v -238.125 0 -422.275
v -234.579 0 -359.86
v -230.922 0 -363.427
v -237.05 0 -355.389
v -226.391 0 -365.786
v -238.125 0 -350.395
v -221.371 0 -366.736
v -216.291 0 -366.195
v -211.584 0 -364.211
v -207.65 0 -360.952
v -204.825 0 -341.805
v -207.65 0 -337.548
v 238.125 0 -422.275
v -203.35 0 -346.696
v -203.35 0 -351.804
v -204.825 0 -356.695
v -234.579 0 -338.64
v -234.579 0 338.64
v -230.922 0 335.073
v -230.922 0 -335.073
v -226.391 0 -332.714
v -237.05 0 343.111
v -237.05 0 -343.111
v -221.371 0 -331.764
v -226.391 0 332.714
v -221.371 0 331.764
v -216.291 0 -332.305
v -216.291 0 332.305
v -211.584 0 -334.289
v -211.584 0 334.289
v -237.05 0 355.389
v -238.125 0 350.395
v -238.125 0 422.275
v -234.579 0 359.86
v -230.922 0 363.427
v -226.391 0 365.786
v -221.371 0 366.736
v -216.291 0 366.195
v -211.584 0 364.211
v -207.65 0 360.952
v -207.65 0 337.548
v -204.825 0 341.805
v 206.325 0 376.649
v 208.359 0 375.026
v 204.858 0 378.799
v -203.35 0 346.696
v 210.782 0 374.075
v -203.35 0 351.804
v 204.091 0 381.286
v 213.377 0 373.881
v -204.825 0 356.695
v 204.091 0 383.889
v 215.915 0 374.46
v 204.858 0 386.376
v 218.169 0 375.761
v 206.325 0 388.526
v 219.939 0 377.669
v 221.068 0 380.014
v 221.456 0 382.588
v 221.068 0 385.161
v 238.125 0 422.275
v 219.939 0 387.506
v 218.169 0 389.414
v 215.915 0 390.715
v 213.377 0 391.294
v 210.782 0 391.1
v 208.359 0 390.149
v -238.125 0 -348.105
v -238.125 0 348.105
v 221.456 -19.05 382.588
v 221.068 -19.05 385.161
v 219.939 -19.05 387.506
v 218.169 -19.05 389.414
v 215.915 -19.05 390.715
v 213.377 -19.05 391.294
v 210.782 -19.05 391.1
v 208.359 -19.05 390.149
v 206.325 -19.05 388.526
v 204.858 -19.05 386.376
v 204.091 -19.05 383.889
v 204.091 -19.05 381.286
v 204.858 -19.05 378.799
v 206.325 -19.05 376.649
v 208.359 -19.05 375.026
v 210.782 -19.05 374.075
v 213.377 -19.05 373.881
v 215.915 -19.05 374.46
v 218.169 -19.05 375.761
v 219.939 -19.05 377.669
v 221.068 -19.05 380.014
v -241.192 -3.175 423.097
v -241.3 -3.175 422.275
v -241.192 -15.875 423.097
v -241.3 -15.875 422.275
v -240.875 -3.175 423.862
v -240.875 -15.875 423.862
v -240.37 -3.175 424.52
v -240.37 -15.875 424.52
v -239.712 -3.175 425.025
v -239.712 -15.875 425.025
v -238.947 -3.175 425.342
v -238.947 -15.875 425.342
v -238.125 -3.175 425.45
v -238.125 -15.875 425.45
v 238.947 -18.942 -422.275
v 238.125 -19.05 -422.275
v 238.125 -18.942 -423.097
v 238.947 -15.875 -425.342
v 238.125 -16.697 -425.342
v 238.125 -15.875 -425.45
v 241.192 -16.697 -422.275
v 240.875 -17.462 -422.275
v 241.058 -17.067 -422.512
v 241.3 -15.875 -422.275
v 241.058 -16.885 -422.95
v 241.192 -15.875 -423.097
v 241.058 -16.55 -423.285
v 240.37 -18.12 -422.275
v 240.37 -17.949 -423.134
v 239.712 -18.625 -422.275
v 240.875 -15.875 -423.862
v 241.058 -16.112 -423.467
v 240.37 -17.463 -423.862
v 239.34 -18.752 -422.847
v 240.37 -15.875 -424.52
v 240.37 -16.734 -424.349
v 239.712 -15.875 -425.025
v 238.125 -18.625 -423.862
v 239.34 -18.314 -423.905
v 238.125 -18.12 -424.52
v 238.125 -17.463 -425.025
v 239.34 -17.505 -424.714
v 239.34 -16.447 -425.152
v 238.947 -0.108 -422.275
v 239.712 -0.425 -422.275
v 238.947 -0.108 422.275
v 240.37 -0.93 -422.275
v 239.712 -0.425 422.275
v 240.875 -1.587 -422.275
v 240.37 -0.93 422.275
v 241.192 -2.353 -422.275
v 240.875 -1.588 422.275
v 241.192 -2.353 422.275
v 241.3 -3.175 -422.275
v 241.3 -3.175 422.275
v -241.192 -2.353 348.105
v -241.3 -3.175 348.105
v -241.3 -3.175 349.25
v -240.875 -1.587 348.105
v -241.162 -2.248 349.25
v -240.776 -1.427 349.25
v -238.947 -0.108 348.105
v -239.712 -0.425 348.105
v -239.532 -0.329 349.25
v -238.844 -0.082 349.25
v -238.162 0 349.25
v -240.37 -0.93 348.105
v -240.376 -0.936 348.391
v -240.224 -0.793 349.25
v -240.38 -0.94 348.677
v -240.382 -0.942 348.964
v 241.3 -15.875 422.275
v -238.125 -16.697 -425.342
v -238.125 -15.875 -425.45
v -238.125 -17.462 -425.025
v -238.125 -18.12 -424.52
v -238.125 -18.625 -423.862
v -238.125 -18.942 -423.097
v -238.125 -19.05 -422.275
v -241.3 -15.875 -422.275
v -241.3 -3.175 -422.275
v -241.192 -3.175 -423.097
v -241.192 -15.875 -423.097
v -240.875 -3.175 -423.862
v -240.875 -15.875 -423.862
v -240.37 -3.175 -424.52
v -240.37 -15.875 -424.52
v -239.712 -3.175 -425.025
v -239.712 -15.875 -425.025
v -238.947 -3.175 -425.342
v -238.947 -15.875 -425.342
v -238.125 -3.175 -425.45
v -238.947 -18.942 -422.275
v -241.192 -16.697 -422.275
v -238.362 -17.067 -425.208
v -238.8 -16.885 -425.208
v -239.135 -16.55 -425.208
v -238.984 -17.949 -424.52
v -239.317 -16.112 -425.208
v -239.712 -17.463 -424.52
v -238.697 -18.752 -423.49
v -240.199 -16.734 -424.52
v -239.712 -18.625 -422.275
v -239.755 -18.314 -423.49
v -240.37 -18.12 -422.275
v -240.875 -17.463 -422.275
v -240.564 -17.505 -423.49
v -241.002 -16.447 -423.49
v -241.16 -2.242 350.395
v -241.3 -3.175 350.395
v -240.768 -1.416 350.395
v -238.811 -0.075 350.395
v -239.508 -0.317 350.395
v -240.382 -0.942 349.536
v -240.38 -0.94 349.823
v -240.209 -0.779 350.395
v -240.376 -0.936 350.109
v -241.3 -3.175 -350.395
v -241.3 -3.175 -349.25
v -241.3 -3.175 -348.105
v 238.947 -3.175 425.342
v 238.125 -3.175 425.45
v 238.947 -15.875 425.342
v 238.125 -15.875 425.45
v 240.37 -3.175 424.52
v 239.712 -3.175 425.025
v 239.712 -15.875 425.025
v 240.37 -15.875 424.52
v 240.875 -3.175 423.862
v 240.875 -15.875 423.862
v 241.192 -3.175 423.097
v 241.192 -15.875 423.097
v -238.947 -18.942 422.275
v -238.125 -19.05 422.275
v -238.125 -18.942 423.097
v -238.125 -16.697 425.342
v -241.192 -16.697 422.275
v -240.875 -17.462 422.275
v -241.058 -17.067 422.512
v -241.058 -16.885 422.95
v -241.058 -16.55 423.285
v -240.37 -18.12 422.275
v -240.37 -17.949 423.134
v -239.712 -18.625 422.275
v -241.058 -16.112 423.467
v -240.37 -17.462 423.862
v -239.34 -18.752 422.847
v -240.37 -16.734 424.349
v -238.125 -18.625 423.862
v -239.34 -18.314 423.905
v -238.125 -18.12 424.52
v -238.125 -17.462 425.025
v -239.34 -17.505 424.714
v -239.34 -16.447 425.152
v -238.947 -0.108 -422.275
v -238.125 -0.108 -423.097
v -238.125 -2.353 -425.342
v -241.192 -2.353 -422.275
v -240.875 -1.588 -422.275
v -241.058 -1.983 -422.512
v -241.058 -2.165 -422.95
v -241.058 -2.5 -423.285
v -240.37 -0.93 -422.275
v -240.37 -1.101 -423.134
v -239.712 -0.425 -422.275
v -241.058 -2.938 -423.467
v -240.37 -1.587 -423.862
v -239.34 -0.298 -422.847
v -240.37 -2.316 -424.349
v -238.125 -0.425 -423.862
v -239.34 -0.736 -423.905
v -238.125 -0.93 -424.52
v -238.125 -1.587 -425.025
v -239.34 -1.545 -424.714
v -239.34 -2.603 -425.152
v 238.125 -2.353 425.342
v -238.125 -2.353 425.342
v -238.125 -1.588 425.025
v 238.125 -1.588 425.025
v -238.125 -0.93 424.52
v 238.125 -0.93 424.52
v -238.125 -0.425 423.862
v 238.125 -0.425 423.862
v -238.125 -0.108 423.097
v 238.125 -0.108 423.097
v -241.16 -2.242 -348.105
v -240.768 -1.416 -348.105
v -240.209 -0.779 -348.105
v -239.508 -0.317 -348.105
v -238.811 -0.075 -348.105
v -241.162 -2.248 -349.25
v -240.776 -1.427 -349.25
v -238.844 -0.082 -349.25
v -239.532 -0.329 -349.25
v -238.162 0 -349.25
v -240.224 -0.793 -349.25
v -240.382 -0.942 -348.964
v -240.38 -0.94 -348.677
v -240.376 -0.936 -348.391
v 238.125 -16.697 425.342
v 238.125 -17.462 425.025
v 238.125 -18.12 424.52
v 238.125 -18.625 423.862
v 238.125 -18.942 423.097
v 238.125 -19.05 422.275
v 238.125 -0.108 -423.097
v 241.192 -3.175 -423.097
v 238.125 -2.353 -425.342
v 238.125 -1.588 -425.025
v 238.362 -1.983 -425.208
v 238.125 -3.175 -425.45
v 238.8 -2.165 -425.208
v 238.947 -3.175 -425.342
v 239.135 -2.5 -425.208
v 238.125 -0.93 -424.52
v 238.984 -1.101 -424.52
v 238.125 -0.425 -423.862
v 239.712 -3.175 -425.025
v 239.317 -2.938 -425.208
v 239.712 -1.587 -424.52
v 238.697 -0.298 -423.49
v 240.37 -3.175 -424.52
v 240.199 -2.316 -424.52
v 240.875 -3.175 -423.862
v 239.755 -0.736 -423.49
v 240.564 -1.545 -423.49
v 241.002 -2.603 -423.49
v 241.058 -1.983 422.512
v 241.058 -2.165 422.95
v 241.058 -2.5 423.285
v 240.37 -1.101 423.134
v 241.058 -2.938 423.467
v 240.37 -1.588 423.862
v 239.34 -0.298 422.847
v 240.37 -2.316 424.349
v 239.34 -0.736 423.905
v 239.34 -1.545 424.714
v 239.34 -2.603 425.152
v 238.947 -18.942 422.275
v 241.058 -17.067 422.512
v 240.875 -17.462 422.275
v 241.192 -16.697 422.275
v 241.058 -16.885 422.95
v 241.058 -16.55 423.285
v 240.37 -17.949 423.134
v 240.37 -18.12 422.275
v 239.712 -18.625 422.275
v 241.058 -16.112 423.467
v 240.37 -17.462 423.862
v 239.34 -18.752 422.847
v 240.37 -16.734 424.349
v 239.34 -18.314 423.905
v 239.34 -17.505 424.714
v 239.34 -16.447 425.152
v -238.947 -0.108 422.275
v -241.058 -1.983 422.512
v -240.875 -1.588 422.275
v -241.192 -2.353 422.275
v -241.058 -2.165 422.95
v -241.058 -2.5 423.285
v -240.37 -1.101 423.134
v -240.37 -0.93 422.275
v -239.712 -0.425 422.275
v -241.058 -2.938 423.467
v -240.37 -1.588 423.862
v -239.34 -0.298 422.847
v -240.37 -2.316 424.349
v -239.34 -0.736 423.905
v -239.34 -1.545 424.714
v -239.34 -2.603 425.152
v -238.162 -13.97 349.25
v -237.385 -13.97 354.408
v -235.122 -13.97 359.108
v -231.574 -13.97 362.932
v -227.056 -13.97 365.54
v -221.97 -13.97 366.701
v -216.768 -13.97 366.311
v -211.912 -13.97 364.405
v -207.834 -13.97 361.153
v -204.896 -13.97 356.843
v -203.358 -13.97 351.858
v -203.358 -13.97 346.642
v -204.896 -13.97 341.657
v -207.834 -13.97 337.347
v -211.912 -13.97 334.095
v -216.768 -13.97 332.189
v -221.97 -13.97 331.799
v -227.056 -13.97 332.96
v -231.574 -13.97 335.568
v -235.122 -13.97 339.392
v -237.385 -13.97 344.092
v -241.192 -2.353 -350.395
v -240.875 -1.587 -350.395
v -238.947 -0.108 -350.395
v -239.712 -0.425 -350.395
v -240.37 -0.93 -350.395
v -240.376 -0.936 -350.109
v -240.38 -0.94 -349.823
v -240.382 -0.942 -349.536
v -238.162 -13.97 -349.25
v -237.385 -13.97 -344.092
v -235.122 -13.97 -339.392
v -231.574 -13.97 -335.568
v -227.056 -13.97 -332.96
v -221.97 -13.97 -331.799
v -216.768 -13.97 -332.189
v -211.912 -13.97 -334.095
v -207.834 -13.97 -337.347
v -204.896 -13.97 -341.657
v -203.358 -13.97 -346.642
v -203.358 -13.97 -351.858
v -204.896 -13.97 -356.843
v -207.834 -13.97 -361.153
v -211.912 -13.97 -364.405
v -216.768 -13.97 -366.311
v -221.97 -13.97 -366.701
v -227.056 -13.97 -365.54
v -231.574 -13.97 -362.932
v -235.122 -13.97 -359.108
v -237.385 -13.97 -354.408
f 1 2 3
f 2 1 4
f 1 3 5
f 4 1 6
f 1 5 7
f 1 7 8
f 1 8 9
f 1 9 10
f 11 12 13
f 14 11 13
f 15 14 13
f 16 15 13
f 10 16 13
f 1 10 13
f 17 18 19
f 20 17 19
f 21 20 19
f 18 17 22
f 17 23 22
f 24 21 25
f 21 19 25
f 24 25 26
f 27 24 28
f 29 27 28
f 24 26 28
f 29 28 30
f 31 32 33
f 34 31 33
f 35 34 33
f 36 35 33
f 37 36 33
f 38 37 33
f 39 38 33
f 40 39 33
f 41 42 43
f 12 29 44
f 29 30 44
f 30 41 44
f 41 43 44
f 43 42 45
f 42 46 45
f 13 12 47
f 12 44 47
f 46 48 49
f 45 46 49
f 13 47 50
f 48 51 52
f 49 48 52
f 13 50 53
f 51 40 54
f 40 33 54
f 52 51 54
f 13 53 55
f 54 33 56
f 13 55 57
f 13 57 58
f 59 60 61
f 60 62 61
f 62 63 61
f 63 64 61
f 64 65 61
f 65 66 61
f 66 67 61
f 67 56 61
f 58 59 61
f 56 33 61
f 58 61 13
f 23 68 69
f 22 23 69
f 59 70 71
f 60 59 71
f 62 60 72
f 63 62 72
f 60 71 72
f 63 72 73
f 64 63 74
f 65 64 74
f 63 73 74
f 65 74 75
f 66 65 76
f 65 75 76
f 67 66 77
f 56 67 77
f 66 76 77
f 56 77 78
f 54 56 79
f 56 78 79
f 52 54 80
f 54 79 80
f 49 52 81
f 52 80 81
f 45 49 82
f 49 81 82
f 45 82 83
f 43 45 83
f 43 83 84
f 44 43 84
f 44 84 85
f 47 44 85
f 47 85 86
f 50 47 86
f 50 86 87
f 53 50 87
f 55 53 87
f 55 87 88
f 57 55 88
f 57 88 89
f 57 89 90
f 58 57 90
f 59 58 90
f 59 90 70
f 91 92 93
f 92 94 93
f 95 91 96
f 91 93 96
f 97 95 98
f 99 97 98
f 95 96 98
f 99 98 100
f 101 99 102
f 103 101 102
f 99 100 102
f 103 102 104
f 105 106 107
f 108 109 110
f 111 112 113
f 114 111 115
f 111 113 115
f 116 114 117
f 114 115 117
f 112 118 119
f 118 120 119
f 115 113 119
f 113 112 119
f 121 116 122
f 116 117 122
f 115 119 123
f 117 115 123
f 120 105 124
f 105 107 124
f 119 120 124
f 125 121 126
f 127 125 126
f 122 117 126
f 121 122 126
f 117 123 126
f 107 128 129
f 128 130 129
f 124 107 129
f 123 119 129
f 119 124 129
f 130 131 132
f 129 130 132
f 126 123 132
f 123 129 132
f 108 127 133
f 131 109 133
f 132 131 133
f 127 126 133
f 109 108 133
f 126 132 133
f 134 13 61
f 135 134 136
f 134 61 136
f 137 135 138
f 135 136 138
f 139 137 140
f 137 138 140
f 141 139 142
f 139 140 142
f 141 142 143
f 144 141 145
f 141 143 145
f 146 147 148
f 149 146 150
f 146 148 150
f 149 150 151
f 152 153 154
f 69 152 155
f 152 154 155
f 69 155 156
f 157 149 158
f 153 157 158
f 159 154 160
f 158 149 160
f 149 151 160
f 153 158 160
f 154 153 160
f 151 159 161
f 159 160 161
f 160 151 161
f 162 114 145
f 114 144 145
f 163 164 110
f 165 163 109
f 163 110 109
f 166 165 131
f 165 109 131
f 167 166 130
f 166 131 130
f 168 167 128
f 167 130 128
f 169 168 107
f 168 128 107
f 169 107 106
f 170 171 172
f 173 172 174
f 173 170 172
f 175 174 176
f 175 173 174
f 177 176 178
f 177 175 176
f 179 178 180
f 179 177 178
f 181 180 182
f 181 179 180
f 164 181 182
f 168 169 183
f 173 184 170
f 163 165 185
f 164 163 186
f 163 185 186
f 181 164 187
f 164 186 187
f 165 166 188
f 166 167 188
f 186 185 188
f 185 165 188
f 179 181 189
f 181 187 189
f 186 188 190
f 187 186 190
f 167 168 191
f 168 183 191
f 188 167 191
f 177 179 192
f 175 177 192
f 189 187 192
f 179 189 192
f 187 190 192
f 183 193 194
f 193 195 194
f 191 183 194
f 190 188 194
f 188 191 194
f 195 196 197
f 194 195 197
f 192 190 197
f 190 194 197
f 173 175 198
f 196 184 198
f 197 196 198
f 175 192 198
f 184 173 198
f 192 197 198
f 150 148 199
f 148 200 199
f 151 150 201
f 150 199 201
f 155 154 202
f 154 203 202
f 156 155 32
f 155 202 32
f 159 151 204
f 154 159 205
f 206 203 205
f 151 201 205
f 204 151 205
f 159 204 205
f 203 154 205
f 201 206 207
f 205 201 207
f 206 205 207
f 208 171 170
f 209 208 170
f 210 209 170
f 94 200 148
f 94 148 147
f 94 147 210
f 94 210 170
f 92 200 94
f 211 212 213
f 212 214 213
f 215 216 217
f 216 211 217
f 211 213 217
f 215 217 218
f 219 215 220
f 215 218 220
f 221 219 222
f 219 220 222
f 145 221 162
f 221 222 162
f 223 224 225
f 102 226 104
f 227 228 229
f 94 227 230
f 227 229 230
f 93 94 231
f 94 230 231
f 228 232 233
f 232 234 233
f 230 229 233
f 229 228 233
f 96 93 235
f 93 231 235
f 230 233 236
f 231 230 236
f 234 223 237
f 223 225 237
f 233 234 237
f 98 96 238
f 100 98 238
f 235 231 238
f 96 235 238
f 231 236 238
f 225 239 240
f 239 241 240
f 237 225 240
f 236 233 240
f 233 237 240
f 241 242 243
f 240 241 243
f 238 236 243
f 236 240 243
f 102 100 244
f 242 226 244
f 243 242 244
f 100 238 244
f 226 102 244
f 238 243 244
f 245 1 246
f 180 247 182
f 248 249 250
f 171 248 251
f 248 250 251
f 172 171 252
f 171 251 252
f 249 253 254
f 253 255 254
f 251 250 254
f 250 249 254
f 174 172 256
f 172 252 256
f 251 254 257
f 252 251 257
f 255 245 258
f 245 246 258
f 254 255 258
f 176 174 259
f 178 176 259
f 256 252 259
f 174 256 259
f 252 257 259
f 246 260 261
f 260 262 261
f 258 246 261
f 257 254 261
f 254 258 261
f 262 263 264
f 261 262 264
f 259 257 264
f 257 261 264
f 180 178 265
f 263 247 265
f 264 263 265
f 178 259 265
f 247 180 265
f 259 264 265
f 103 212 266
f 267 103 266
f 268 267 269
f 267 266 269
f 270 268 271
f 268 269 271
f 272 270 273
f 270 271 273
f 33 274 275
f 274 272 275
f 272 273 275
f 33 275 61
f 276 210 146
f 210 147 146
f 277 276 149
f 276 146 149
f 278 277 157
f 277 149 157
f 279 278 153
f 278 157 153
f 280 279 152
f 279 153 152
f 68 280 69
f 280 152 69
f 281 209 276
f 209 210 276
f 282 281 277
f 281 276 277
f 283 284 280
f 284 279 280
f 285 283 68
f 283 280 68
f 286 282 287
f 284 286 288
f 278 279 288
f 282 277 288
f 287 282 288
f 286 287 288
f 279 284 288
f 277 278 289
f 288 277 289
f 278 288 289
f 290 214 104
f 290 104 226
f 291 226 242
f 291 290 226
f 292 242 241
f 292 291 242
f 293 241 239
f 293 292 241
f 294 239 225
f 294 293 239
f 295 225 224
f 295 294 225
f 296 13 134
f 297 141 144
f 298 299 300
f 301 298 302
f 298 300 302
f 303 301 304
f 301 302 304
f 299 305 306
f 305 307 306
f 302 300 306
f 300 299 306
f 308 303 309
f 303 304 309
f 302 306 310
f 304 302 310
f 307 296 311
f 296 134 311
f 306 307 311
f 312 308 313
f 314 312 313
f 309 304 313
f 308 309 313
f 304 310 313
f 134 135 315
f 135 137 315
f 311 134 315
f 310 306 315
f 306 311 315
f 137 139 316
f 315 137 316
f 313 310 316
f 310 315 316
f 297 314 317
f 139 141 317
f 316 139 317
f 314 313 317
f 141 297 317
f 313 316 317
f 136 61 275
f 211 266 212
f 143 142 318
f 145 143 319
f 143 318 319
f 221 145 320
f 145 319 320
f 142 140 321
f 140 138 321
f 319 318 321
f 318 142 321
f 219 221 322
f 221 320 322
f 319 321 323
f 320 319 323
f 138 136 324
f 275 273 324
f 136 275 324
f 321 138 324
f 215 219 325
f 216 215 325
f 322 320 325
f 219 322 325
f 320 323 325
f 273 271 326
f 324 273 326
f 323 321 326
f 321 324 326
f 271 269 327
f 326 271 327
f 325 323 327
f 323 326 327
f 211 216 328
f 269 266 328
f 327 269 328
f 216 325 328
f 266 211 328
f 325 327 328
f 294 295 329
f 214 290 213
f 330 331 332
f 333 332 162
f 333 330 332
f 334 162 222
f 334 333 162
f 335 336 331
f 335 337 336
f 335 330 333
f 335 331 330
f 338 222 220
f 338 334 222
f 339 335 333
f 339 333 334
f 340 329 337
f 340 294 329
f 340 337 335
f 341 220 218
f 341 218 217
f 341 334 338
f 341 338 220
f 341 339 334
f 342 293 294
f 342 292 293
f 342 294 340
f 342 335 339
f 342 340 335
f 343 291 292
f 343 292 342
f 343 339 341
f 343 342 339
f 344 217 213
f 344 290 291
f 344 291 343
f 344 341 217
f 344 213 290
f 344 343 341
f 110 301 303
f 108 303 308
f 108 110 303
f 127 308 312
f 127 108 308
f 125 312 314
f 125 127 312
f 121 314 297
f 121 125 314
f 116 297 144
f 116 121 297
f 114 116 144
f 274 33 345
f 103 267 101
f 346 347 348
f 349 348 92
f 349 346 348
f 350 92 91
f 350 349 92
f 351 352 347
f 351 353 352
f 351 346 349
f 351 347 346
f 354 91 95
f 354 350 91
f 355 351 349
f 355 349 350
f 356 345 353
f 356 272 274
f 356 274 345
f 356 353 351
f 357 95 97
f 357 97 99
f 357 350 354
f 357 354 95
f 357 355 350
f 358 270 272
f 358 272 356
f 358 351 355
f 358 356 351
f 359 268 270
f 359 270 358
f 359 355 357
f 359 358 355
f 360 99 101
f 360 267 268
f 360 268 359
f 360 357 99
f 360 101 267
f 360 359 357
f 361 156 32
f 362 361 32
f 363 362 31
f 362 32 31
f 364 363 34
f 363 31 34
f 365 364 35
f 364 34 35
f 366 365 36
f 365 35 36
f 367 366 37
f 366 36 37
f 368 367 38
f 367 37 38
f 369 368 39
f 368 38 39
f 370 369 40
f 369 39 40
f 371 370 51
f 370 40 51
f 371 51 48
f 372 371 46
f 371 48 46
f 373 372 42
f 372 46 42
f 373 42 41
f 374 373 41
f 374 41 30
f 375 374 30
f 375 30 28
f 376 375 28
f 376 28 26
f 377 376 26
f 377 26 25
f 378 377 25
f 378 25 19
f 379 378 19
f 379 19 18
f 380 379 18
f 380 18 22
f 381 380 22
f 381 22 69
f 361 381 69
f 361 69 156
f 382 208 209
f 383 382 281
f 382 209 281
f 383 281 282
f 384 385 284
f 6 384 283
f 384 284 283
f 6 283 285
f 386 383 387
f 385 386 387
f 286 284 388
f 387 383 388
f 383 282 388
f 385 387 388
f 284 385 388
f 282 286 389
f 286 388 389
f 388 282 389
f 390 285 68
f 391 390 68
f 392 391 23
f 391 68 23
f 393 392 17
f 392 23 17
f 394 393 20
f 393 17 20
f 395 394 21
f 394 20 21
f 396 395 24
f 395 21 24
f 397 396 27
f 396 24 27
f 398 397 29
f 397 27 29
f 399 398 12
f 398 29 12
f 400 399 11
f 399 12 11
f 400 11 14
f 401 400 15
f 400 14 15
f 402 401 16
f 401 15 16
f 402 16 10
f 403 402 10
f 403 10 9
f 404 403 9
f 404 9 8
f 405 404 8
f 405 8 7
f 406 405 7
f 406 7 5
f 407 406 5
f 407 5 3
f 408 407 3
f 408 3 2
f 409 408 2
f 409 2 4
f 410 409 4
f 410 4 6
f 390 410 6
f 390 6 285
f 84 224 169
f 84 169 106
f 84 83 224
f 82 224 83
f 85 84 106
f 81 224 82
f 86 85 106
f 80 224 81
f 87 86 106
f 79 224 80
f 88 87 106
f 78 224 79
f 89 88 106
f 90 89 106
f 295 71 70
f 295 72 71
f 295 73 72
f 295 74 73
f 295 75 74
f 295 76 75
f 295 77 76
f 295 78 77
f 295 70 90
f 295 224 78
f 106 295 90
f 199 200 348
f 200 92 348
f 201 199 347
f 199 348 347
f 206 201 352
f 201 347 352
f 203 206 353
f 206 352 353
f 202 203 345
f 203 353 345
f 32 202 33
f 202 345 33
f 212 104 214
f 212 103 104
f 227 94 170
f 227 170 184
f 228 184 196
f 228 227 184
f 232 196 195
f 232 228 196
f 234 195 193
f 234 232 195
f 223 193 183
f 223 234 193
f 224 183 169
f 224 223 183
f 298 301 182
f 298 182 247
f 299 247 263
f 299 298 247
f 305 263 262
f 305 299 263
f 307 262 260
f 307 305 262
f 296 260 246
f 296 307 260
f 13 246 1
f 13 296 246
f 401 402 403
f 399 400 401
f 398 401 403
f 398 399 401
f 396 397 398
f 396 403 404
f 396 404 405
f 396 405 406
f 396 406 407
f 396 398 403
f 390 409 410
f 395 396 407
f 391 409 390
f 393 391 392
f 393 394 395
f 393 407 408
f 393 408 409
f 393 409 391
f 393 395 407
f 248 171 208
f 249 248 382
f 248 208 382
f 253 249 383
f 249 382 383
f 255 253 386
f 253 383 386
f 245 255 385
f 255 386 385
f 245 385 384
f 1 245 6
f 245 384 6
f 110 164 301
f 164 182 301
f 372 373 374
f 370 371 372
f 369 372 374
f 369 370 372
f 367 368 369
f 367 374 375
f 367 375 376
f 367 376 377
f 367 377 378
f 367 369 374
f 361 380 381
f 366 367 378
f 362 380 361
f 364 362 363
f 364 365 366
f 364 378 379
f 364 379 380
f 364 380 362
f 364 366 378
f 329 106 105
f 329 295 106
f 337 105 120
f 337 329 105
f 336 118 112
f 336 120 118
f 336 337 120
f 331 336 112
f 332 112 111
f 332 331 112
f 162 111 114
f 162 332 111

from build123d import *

# Parameters (mm, degrees)
F0_W     = 482.6
F0_H     = 850.9
F1_DEPTH = 19.05
F2_R     = 8.73125
F3_DEPTH = 19.051
F4_R     = 17.5
F5_DEPTH = 13.97
F6_R     = 3.175


with BuildPart() as f1:
    # F0 (on Front) → F1 (new body)
    with BuildSketch(Plane.XZ):
        Rectangle(F0_W, F0_H)
    extrude(amount=F1_DEPTH)

    # F2 (on face) → F3 (cut, through all)
    with BuildSketch(Plane.XZ.offset(19.05)):
        with Locations((212.725, 382.5875)):
            Circle(F2_R)
    extrude(amount=-F3_DEPTH, mode=Mode.SUBTRACT)

    # F4 (on face) → F5 (cut)
    with BuildSketch(Plane(origin=(0, 0, 0), x_dir=(-1, 0, 0), z_dir=(0, 1, 0))):
        with Locations((220.6625, 349.25)):
            Circle(F4_R)
        with Locations((220.6625, -349.25)):
            Circle(F4_R)
    extrude(amount=-F5_DEPTH, mode=Mode.SUBTRACT)

    # F6
    f6_edges = [f1.edges().sort_by_distance(p)[0] for p in [
        (0, -19.05, 425.45),
        (-241.3, -19.05, 0),
        (0, -19.05, -425.45),
        (241.3, -19.05, 0),
        (0, 0, 425.45),
        (241.3, 0, 0),
        (0, 0, -425.45),
        (-241.3, 0, 0),
        (-241.3, -9.525, 425.45),
        (241.3, -9.525, 425.45),
        (241.3, -9.525, -425.45),
        (-241.3, -9.525, -425.45),
    ]]
    fillet(f6_edges, radius=F6_R)


solid = f1.part
